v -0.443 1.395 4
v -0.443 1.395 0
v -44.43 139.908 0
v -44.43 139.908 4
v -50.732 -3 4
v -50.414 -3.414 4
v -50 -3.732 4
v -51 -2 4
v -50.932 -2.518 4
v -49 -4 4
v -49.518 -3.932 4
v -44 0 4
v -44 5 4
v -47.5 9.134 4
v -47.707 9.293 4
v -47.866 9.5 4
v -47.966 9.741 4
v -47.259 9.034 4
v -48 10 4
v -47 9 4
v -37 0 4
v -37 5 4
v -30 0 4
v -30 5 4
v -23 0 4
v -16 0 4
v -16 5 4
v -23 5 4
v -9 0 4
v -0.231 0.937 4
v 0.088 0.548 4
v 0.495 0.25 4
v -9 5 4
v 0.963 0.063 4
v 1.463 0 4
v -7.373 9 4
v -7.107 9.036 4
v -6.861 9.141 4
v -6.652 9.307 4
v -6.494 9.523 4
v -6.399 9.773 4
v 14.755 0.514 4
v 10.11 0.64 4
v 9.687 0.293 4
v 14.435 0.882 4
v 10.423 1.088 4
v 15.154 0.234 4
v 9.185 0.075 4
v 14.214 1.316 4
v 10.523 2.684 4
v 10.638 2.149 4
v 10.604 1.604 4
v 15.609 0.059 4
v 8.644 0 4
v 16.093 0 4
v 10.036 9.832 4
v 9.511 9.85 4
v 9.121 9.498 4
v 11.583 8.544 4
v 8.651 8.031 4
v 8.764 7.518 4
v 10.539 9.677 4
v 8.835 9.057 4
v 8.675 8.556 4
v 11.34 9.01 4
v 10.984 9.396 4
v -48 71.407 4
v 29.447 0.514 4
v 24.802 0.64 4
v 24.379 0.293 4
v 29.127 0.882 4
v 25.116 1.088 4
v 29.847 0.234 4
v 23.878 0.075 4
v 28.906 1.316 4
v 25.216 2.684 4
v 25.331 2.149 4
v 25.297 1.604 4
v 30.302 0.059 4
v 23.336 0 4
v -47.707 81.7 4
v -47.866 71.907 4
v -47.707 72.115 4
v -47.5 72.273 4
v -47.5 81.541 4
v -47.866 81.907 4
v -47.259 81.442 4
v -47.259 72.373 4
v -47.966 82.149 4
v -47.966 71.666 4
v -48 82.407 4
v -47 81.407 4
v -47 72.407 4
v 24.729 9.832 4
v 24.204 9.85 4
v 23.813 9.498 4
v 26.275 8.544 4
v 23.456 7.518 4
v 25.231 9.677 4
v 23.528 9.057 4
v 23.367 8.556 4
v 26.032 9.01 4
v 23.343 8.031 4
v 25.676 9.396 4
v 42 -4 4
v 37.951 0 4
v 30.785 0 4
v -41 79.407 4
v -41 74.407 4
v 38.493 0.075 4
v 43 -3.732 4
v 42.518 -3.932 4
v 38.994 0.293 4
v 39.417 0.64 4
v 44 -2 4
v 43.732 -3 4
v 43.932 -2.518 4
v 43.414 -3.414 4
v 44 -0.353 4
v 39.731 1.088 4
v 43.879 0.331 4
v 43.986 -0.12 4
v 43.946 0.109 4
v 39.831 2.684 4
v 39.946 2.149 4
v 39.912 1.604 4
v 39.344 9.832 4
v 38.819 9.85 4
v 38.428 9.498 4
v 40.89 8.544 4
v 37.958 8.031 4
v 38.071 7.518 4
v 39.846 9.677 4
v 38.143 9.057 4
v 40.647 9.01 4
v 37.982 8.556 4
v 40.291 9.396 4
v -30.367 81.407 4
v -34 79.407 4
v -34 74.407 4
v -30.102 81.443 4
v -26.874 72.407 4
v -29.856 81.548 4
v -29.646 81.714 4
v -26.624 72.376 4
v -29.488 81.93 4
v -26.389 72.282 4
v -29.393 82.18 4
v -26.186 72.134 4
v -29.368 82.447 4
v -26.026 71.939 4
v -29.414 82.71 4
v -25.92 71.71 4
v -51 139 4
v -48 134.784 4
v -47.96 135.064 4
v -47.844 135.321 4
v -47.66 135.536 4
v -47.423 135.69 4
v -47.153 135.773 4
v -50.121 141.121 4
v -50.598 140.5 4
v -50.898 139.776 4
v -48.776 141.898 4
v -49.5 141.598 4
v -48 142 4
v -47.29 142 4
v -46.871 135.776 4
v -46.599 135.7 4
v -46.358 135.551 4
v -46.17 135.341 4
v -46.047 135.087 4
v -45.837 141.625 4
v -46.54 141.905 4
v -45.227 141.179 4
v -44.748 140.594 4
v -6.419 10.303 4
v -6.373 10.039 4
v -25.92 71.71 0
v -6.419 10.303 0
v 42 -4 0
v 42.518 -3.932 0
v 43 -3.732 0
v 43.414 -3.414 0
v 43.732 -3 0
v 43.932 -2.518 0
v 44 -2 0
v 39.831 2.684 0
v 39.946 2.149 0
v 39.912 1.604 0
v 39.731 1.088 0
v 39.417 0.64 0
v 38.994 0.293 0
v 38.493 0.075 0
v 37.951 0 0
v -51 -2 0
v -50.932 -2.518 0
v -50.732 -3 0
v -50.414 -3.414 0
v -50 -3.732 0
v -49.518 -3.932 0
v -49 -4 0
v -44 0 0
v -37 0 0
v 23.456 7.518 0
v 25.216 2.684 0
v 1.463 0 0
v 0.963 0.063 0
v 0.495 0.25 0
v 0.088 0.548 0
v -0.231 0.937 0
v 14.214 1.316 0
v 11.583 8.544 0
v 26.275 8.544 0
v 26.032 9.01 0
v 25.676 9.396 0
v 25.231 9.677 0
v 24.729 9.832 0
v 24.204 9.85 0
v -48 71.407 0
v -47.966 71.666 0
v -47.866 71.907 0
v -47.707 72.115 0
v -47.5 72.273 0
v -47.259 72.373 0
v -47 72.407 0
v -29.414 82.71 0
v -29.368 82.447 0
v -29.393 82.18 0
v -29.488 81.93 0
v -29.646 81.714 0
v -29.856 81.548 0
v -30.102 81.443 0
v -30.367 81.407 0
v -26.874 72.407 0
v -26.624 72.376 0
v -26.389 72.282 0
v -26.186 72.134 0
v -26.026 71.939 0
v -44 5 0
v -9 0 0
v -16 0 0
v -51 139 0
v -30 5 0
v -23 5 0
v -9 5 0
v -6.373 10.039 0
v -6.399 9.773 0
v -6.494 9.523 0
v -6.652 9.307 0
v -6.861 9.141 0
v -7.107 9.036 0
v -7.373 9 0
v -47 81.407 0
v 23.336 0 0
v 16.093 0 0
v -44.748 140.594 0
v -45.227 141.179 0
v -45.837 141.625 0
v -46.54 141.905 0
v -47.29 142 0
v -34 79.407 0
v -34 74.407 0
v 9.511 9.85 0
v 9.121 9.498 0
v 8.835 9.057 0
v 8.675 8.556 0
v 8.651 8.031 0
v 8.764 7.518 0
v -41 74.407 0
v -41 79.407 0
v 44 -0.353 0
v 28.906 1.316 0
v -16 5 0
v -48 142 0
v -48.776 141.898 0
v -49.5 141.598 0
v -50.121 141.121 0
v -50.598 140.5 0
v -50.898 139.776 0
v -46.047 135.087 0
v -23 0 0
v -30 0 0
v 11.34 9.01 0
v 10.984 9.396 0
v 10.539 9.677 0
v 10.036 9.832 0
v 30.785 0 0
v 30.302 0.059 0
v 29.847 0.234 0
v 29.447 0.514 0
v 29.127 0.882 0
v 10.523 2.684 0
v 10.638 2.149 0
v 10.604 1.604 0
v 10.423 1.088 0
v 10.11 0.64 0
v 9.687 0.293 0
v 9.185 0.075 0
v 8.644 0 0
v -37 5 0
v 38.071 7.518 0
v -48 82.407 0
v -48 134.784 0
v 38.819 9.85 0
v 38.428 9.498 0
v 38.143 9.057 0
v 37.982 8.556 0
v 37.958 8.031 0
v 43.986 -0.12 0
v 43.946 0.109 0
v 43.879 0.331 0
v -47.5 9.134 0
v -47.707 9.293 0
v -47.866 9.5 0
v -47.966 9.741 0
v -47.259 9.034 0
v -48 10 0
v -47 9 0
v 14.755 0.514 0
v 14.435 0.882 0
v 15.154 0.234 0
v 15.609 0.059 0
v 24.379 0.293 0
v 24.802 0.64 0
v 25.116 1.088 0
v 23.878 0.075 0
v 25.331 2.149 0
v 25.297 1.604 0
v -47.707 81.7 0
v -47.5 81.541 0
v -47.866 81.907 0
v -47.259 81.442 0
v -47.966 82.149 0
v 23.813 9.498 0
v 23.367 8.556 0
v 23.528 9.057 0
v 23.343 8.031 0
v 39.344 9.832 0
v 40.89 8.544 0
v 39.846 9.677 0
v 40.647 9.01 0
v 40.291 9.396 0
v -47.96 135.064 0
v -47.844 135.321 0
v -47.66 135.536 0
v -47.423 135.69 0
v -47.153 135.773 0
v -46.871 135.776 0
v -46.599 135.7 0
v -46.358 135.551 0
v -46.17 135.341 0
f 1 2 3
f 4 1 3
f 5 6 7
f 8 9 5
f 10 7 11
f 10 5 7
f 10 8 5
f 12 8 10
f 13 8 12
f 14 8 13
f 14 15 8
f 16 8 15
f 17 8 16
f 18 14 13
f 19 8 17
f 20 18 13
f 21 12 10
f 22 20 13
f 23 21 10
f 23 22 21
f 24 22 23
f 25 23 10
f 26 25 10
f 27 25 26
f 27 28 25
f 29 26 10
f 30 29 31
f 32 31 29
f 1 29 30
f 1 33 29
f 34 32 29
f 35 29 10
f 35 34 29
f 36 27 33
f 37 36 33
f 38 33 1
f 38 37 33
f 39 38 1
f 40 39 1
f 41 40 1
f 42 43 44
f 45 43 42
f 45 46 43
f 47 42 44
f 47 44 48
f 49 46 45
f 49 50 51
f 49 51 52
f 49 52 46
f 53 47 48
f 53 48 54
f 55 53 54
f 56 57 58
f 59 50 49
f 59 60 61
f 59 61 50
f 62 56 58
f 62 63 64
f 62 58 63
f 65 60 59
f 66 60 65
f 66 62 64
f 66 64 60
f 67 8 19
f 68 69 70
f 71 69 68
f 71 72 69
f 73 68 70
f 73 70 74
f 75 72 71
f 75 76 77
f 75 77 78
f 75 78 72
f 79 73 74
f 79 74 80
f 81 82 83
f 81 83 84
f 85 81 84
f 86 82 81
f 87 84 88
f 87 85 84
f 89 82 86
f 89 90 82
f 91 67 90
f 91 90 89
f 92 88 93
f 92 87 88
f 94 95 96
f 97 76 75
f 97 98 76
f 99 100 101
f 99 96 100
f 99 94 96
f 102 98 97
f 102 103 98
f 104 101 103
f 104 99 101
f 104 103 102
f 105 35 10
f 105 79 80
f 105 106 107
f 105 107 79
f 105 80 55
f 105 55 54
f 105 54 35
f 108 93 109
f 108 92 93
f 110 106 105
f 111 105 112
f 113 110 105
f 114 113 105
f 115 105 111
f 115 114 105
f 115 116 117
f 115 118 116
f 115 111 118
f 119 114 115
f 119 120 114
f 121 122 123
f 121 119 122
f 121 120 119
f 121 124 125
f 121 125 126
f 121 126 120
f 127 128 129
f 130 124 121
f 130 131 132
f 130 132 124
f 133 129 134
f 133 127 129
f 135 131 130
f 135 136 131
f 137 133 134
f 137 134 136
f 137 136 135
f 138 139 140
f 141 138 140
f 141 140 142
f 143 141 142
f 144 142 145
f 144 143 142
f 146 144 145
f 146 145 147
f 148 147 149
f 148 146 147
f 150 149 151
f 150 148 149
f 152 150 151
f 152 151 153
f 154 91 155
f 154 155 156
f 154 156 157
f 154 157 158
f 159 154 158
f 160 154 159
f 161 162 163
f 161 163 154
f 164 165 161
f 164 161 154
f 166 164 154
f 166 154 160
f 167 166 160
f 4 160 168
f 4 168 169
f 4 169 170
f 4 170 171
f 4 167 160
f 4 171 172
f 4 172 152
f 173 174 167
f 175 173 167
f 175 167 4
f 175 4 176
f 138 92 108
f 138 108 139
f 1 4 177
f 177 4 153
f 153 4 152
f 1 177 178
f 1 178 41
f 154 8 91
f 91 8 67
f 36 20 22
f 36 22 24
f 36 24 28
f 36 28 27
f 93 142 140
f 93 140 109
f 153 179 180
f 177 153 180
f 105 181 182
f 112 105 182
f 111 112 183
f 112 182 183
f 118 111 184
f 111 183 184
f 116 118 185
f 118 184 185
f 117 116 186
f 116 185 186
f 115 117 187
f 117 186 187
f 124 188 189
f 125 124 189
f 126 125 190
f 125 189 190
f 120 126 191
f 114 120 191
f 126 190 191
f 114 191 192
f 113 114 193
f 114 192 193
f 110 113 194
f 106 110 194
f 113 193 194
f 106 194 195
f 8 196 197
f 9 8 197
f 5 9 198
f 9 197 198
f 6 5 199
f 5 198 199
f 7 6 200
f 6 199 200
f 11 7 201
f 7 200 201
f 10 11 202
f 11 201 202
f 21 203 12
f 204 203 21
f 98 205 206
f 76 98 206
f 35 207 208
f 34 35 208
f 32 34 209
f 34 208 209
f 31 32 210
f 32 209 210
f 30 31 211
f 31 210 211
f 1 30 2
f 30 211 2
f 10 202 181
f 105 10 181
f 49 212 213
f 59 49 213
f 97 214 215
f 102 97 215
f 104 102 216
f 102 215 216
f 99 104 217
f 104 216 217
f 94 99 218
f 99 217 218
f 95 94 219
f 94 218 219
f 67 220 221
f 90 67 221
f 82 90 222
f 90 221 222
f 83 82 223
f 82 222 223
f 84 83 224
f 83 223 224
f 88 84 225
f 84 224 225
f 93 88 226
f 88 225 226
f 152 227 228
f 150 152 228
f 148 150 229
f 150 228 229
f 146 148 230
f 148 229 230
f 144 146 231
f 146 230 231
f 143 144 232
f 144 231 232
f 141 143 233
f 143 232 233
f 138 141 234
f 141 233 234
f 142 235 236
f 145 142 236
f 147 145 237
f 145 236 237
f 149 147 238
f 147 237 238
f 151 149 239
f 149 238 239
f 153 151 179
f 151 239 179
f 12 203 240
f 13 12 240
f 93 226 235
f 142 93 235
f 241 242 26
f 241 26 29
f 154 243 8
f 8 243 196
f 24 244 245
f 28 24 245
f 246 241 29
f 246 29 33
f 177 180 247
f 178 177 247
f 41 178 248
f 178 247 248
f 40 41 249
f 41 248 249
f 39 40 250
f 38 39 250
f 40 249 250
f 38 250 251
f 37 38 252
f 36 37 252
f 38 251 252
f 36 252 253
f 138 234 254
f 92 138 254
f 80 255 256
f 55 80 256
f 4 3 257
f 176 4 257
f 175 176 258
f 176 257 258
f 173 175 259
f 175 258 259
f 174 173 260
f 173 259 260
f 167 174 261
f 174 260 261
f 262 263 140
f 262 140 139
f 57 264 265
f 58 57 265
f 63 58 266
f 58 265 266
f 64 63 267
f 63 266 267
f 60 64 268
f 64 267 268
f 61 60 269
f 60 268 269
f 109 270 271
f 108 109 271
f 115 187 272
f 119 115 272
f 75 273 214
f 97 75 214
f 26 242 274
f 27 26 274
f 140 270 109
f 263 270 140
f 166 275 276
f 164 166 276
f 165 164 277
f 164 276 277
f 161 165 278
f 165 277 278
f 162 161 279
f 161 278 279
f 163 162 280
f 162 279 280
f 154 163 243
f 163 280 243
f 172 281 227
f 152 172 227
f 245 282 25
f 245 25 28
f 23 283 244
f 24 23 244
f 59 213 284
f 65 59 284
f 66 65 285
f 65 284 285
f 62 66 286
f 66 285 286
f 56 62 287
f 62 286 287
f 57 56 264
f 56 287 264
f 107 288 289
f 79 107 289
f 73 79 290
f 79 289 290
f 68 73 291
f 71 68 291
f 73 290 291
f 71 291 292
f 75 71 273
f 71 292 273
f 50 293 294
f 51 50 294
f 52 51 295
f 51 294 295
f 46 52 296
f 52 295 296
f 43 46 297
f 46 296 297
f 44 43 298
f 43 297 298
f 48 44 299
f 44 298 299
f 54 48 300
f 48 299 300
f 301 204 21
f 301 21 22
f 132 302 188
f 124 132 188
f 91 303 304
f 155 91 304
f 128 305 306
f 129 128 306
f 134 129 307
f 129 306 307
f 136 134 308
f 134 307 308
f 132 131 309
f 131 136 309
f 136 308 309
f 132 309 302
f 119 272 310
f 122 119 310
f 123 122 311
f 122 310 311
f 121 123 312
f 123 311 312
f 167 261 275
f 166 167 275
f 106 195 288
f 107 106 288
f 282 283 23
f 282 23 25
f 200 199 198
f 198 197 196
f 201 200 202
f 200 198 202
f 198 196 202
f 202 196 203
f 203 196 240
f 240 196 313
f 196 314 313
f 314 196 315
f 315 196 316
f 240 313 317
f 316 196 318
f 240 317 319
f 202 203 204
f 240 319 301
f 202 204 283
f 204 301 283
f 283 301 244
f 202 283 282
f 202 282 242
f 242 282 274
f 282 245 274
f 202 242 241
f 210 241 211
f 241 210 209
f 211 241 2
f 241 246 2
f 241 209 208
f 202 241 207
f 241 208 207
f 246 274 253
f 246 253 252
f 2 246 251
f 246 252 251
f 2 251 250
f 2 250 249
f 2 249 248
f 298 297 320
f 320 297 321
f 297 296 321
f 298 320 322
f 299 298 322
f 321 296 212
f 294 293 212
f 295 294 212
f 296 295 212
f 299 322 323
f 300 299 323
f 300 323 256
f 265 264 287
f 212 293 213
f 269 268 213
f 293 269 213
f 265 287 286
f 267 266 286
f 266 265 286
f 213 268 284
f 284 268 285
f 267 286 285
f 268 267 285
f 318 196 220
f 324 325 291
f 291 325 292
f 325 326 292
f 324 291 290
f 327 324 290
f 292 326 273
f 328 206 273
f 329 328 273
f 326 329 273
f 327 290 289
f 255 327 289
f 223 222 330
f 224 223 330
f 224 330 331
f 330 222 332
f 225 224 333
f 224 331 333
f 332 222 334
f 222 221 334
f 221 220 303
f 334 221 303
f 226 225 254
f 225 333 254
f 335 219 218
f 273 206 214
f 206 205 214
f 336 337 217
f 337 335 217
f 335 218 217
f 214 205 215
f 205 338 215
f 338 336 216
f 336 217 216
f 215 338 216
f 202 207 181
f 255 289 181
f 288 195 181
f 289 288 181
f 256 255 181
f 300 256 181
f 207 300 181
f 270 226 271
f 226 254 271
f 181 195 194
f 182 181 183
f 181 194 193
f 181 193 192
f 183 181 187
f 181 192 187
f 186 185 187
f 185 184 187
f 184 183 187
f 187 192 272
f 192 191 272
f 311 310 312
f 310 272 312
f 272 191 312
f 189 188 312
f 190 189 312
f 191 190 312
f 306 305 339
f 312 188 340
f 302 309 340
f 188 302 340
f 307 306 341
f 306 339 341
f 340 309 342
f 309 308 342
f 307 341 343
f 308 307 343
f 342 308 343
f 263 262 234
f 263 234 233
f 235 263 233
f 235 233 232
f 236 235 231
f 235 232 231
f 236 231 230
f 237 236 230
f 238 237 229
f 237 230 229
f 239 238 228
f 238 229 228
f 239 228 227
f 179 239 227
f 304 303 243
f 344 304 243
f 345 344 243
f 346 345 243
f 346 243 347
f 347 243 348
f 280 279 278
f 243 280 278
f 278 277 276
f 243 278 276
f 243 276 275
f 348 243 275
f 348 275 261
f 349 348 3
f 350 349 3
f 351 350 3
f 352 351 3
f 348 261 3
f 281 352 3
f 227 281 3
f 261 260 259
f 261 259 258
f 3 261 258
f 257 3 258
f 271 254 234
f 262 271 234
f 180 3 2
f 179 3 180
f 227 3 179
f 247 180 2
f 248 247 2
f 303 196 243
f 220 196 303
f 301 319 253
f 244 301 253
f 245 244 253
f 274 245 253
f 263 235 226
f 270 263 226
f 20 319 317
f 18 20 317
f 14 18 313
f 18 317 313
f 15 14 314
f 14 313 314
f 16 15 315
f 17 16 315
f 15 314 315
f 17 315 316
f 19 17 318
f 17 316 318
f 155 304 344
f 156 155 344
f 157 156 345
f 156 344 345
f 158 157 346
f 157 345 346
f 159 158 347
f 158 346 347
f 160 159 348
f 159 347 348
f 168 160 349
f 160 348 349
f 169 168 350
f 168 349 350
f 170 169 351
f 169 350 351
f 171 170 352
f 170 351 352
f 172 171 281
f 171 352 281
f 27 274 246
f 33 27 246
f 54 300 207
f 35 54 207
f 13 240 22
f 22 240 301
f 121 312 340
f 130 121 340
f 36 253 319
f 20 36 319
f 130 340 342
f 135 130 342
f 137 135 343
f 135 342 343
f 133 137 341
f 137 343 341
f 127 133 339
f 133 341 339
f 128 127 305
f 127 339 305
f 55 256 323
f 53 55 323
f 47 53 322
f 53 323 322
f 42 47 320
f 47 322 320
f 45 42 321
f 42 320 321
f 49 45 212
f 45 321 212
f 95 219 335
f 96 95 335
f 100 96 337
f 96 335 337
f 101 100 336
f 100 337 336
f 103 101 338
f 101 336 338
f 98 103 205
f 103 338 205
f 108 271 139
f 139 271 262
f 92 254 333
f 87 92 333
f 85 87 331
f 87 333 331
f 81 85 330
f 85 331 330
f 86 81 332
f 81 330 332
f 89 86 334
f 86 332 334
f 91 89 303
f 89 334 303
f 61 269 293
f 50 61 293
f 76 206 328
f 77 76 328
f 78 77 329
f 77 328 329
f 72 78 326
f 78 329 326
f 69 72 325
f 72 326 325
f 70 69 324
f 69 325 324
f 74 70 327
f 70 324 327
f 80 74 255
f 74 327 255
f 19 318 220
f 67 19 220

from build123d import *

# Parameters (mm, degrees)
F0_W        = 7
F0_H        = 5
F1_DEPTH    = 4
F2_T1_DEPTH = 4
F2_T3_DEPTH = 14
F2_T5_DEPTH = 5.7632698071


# Not quite as in the source:
# - a fillet or chamfer that OpenCascade refuses, or shapes differently, is made with other operations: its cross-section is extruded or revolved along the edge and cut away or added


with BuildPart() as f1:
    # F0 (on Top) → F1 (new body)
    with BuildSketch(Plane.XY):
        with BuildLine():
            Line((-51, -4), (44, -4))
            Line((44, -4), (44, 0))
            Line((44, 0), (40.8074666826, 0))
            Line((40.8074666826, 0), (29.3850666349, 0))
            Line((29.3850666349, 0), (26.1925333174, 0))
            Line((26.1925333174, 0), (14.6925333174, 0))
            Line((14.6925333174, 0), (11.5, 0))
            Line((11.5, 0), (0, 0))
            Line((0, 0), (-44.4302483166, 139.9080159757))
            ThreePointArc((-44.4302483166, 139.9080159757), (-45.5180993372, 141.4211616971), (-47.2895326655, 142))
            Line((-47.2895326655, 142), (-48, 142))
            ThreePointArc((-48, 142), (-50.1213203436, 141.1213203436), (-51, 139))
            Line((-51, 139), (-51, -4))
        make_face()
        with Locations((-40.5, 2.5)):
            Rectangle(F0_W, F0_H, mode=Mode.SUBTRACT)
        with Locations((-26.5, 2.5)):
            Rectangle(F0_W, F0_H, mode=Mode.SUBTRACT)
        with Locations((-12.5, 2.5)):
            Rectangle(F0_W, F0_H, mode=Mode.SUBTRACT)
        with BuildLine():
            Line((-7.3725300405, 9), (-47, 9))
            ThreePointArc((-47, 9), (-47.7071067812, 9.2928932188), (-48, 10))
            Line((-48, 10), (-48, 71.4074290533))
            ThreePointArc((-48, 71.4074290533), (-47.7071067812, 72.1145358345), (-47, 72.4074290533))
            Line((-47, 72.4074290533), (-26.8735379155, 72.4074290533))
            ThreePointArc((-26.8735379155, 72.4074290533), (-26.2830601394, 72.2144829523), (-25.9204431326, 71.7101010452))
            Line((-25.9204431326, 71.7101010452), (-6.4194352575, 10.3026719919))
            ThreePointArc((-6.4194352575, 10.3026719919), (-6.5654761415, 9.4095222239), (-7.3725300405, 9))
        make_face(mode=Mode.SUBTRACT)
        with Locations((-37.5, 76.9074290533)):
            Rectangle(F0_W, F0_H, mode=Mode.SUBTRACT)
        with BuildLine():
            ThreePointArc((-48, 134.7843734895), (-47.1531424452, 135.7725776139), (-46.046905217, 135.0870454814))
            Line((-46.046905217, 135.0870454814), (-29.4136863758, 82.7101010452))
            ThreePointArc((-29.4136863758, 82.7101010452), (-29.5597272597, 81.8169512772), (-30.3667811588, 81.4074290533))
            Line((-30.3667811588, 81.4074290533), (-47, 81.4074290533))
            ThreePointArc((-47, 81.4074290533), (-47.7071067812, 81.7003222721), (-48, 82.4074290533))
            Line((-48, 82.4074290533), (-48, 134.7843734895))
        make_face(mode=Mode.SUBTRACT)
        Polygon((40.8074666826, 0), (44, 0), (40.2063431117, 10.4229866378), (37.3872652493, 9.3969262079), align=None)
        Polygon((26.1925333174, 0), (29.3850666349, 0), (25.5914097465, 10.4229866378), (22.7723318842, 9.3969262079), align=None)
        Polygon((11.5, 0), (14.6925333174, 0), (10.8988764291, 10.4229866378), (8.0797985667, 9.3969262079), align=None)
    extrude(amount=F1_DEPTH)

    # F2: fillet of radius 2 on 15 edges, made by hand

    # F2_s2 → F2_t1 (join)
    with BuildSketch(Plane.XY):
        with BuildLine():
            ThreePointArc((39.8305559107, 2.6840402867), (39.5894747577, 0.8528471273), (37.9511706691, 0))
            Line((37.9511706691, 0), (40.8074666826, 0))
            Line((40.8074666826, 0), (39.8305559107, 2.6840402867))
        make_face()
        with BuildLine():
            ThreePointArc((16.0929483938, 0), (14.9457955211, 0.3616959114), (14.2135631523, 1.3159597133))
            Line((14.2135631523, 1.3159597133), (14.6925333174, 0))
            Line((14.6925333174, 0), (16.0929483938, 0))
        make_face()
        with BuildLine():
            ThreePointArc((10.5230892281, 2.6840402867), (10.2820080751, 0.8528471273), (8.6437039865, 0))
            Line((8.6437039865, 0), (11.5, 0))
            Line((11.5, 0), (10.5230892281, 2.6840402867))
        make_face()
        with BuildLine():
            ThreePointArc((1.4632920473, 0), (0.2823364951, 0.3858922019), (-0.4428975187, 1.3946560162))
            Line((-0.4428975187, 1.3946560162), (0, 0))
            Line((0, 0), (1.4632920473, 0))
        make_face()
        with BuildLine():
            ThreePointArc((25.2156225455, 2.6840402867), (24.9745413925, 0.8528471273), (23.3362373039, 0))
            Line((23.3362373039, 0), (26.1925333174, 0))
            Line((26.1925333174, 0), (25.2156225455, 2.6840402867))
        make_face()
        with BuildLine():
            ThreePointArc((30.7854817113, 0), (29.6383288386, 0.3616959114), (28.9060964697, 1.3159597133))
            Line((28.9060964697, 1.3159597133), (29.3850666349, 0))
            Line((29.3850666349, 0), (30.7854817113, 0))
        make_face()
    extrude(amount=F2_T1_DEPTH)

    # F2_s4 → F2_t3 (cut)
    with BuildSketch(Plane.XY.offset(-5)):
        with BuildLine():
            ThreePointArc((-51, -2), (-50.4142135624, -3.4142135624), (-49, -4))
            Line((-49, -4), (-51, -4))
            Line((-51, -4), (-51, -2))
        make_face()
        with BuildLine():
            ThreePointArc((42, -4), (43.4142135624, -3.4142135624), (44, -2))
            Line((44, -2), (44, -4))
            Line((44, -4), (42, -4))
        make_face()
        with BuildLine():
            ThreePointArc((40.8903833983, 8.5436013963), (39.8562346802, 9.6721766837), (38.3269578701, 9.7389463512))
            Line((38.3269578701, 9.7389463512), (40.2063431117, 10.4229866378))
            Line((40.2063431117, 10.4229866378), (40.8903833983, 8.5436013963))
        make_face()
        with BuildLine():
            ThreePointArc((39.2666504909, 10.0809664945), (38.1380752035, 9.0468177764), (38.071305536, 7.5175409663))
            Line((38.071305536, 7.5175409663), (37.3872652493, 9.3969262079))
            Line((37.3872652493, 9.3969262079), (39.2666504909, 10.0809664945))
        make_face()
        with BuildLine():
            ThreePointArc((11.5829167158, 8.5436013963), (10.5487679977, 9.6721766837), (9.0194911875, 9.7389463512))
            Line((9.0194911875, 9.7389463512), (10.8988764291, 10.4229866378))
            Line((10.8988764291, 10.4229866378), (11.5829167158, 8.5436013963))
        make_face()
        with BuildLine():
            ThreePointArc((9.9591838083, 10.0809664945), (8.8306085209, 9.0468177764), (8.7638388534, 7.5175409663))
            Line((8.7638388534, 7.5175409663), (8.0797985667, 9.3969262079))
            Line((8.0797985667, 9.3969262079), (9.9591838083, 10.0809664945))
        make_face()
        with BuildLine():
            ThreePointArc((24.6517171257, 10.0809664945), (23.5231418383, 9.0468177764), (23.4563721708, 7.5175409663))
            Line((23.4563721708, 7.5175409663), (22.7723318842, 9.3969262079))
            Line((22.7723318842, 9.3969262079), (24.6517171257, 10.0809664945))
        make_face()
        with BuildLine():
            ThreePointArc((26.2754500332, 8.5436013963), (25.2413013151, 9.6721766837), (23.712024505, 9.7389463512))
            Line((23.712024505, 9.7389463512), (25.5914097465, 10.4229866378))
            Line((25.5914097465, 10.4229866378), (26.2754500332, 8.5436013963))
        make_face()
    extrude(amount=F2_T3_DEPTH, mode=Mode.SUBTRACT)

    # F2_s6 → F2_t5 (cut)
    with BuildSketch(Plane.XY.offset(-0.8816349035)):
        with BuildLine():
            ThreePointArc((44, -0.3526539614), (43.969615506, -0.0053576061), (43.8793852416, 0.3313863252))
            Line((43.8793852416, 0.3313863252), (44, 0))
            Line((44, 0), (44, -0.3526539614))
        make_face()
    extrude(amount=F2_T5_DEPTH, mode=Mode.SUBTRACT)


solid = f1.part
